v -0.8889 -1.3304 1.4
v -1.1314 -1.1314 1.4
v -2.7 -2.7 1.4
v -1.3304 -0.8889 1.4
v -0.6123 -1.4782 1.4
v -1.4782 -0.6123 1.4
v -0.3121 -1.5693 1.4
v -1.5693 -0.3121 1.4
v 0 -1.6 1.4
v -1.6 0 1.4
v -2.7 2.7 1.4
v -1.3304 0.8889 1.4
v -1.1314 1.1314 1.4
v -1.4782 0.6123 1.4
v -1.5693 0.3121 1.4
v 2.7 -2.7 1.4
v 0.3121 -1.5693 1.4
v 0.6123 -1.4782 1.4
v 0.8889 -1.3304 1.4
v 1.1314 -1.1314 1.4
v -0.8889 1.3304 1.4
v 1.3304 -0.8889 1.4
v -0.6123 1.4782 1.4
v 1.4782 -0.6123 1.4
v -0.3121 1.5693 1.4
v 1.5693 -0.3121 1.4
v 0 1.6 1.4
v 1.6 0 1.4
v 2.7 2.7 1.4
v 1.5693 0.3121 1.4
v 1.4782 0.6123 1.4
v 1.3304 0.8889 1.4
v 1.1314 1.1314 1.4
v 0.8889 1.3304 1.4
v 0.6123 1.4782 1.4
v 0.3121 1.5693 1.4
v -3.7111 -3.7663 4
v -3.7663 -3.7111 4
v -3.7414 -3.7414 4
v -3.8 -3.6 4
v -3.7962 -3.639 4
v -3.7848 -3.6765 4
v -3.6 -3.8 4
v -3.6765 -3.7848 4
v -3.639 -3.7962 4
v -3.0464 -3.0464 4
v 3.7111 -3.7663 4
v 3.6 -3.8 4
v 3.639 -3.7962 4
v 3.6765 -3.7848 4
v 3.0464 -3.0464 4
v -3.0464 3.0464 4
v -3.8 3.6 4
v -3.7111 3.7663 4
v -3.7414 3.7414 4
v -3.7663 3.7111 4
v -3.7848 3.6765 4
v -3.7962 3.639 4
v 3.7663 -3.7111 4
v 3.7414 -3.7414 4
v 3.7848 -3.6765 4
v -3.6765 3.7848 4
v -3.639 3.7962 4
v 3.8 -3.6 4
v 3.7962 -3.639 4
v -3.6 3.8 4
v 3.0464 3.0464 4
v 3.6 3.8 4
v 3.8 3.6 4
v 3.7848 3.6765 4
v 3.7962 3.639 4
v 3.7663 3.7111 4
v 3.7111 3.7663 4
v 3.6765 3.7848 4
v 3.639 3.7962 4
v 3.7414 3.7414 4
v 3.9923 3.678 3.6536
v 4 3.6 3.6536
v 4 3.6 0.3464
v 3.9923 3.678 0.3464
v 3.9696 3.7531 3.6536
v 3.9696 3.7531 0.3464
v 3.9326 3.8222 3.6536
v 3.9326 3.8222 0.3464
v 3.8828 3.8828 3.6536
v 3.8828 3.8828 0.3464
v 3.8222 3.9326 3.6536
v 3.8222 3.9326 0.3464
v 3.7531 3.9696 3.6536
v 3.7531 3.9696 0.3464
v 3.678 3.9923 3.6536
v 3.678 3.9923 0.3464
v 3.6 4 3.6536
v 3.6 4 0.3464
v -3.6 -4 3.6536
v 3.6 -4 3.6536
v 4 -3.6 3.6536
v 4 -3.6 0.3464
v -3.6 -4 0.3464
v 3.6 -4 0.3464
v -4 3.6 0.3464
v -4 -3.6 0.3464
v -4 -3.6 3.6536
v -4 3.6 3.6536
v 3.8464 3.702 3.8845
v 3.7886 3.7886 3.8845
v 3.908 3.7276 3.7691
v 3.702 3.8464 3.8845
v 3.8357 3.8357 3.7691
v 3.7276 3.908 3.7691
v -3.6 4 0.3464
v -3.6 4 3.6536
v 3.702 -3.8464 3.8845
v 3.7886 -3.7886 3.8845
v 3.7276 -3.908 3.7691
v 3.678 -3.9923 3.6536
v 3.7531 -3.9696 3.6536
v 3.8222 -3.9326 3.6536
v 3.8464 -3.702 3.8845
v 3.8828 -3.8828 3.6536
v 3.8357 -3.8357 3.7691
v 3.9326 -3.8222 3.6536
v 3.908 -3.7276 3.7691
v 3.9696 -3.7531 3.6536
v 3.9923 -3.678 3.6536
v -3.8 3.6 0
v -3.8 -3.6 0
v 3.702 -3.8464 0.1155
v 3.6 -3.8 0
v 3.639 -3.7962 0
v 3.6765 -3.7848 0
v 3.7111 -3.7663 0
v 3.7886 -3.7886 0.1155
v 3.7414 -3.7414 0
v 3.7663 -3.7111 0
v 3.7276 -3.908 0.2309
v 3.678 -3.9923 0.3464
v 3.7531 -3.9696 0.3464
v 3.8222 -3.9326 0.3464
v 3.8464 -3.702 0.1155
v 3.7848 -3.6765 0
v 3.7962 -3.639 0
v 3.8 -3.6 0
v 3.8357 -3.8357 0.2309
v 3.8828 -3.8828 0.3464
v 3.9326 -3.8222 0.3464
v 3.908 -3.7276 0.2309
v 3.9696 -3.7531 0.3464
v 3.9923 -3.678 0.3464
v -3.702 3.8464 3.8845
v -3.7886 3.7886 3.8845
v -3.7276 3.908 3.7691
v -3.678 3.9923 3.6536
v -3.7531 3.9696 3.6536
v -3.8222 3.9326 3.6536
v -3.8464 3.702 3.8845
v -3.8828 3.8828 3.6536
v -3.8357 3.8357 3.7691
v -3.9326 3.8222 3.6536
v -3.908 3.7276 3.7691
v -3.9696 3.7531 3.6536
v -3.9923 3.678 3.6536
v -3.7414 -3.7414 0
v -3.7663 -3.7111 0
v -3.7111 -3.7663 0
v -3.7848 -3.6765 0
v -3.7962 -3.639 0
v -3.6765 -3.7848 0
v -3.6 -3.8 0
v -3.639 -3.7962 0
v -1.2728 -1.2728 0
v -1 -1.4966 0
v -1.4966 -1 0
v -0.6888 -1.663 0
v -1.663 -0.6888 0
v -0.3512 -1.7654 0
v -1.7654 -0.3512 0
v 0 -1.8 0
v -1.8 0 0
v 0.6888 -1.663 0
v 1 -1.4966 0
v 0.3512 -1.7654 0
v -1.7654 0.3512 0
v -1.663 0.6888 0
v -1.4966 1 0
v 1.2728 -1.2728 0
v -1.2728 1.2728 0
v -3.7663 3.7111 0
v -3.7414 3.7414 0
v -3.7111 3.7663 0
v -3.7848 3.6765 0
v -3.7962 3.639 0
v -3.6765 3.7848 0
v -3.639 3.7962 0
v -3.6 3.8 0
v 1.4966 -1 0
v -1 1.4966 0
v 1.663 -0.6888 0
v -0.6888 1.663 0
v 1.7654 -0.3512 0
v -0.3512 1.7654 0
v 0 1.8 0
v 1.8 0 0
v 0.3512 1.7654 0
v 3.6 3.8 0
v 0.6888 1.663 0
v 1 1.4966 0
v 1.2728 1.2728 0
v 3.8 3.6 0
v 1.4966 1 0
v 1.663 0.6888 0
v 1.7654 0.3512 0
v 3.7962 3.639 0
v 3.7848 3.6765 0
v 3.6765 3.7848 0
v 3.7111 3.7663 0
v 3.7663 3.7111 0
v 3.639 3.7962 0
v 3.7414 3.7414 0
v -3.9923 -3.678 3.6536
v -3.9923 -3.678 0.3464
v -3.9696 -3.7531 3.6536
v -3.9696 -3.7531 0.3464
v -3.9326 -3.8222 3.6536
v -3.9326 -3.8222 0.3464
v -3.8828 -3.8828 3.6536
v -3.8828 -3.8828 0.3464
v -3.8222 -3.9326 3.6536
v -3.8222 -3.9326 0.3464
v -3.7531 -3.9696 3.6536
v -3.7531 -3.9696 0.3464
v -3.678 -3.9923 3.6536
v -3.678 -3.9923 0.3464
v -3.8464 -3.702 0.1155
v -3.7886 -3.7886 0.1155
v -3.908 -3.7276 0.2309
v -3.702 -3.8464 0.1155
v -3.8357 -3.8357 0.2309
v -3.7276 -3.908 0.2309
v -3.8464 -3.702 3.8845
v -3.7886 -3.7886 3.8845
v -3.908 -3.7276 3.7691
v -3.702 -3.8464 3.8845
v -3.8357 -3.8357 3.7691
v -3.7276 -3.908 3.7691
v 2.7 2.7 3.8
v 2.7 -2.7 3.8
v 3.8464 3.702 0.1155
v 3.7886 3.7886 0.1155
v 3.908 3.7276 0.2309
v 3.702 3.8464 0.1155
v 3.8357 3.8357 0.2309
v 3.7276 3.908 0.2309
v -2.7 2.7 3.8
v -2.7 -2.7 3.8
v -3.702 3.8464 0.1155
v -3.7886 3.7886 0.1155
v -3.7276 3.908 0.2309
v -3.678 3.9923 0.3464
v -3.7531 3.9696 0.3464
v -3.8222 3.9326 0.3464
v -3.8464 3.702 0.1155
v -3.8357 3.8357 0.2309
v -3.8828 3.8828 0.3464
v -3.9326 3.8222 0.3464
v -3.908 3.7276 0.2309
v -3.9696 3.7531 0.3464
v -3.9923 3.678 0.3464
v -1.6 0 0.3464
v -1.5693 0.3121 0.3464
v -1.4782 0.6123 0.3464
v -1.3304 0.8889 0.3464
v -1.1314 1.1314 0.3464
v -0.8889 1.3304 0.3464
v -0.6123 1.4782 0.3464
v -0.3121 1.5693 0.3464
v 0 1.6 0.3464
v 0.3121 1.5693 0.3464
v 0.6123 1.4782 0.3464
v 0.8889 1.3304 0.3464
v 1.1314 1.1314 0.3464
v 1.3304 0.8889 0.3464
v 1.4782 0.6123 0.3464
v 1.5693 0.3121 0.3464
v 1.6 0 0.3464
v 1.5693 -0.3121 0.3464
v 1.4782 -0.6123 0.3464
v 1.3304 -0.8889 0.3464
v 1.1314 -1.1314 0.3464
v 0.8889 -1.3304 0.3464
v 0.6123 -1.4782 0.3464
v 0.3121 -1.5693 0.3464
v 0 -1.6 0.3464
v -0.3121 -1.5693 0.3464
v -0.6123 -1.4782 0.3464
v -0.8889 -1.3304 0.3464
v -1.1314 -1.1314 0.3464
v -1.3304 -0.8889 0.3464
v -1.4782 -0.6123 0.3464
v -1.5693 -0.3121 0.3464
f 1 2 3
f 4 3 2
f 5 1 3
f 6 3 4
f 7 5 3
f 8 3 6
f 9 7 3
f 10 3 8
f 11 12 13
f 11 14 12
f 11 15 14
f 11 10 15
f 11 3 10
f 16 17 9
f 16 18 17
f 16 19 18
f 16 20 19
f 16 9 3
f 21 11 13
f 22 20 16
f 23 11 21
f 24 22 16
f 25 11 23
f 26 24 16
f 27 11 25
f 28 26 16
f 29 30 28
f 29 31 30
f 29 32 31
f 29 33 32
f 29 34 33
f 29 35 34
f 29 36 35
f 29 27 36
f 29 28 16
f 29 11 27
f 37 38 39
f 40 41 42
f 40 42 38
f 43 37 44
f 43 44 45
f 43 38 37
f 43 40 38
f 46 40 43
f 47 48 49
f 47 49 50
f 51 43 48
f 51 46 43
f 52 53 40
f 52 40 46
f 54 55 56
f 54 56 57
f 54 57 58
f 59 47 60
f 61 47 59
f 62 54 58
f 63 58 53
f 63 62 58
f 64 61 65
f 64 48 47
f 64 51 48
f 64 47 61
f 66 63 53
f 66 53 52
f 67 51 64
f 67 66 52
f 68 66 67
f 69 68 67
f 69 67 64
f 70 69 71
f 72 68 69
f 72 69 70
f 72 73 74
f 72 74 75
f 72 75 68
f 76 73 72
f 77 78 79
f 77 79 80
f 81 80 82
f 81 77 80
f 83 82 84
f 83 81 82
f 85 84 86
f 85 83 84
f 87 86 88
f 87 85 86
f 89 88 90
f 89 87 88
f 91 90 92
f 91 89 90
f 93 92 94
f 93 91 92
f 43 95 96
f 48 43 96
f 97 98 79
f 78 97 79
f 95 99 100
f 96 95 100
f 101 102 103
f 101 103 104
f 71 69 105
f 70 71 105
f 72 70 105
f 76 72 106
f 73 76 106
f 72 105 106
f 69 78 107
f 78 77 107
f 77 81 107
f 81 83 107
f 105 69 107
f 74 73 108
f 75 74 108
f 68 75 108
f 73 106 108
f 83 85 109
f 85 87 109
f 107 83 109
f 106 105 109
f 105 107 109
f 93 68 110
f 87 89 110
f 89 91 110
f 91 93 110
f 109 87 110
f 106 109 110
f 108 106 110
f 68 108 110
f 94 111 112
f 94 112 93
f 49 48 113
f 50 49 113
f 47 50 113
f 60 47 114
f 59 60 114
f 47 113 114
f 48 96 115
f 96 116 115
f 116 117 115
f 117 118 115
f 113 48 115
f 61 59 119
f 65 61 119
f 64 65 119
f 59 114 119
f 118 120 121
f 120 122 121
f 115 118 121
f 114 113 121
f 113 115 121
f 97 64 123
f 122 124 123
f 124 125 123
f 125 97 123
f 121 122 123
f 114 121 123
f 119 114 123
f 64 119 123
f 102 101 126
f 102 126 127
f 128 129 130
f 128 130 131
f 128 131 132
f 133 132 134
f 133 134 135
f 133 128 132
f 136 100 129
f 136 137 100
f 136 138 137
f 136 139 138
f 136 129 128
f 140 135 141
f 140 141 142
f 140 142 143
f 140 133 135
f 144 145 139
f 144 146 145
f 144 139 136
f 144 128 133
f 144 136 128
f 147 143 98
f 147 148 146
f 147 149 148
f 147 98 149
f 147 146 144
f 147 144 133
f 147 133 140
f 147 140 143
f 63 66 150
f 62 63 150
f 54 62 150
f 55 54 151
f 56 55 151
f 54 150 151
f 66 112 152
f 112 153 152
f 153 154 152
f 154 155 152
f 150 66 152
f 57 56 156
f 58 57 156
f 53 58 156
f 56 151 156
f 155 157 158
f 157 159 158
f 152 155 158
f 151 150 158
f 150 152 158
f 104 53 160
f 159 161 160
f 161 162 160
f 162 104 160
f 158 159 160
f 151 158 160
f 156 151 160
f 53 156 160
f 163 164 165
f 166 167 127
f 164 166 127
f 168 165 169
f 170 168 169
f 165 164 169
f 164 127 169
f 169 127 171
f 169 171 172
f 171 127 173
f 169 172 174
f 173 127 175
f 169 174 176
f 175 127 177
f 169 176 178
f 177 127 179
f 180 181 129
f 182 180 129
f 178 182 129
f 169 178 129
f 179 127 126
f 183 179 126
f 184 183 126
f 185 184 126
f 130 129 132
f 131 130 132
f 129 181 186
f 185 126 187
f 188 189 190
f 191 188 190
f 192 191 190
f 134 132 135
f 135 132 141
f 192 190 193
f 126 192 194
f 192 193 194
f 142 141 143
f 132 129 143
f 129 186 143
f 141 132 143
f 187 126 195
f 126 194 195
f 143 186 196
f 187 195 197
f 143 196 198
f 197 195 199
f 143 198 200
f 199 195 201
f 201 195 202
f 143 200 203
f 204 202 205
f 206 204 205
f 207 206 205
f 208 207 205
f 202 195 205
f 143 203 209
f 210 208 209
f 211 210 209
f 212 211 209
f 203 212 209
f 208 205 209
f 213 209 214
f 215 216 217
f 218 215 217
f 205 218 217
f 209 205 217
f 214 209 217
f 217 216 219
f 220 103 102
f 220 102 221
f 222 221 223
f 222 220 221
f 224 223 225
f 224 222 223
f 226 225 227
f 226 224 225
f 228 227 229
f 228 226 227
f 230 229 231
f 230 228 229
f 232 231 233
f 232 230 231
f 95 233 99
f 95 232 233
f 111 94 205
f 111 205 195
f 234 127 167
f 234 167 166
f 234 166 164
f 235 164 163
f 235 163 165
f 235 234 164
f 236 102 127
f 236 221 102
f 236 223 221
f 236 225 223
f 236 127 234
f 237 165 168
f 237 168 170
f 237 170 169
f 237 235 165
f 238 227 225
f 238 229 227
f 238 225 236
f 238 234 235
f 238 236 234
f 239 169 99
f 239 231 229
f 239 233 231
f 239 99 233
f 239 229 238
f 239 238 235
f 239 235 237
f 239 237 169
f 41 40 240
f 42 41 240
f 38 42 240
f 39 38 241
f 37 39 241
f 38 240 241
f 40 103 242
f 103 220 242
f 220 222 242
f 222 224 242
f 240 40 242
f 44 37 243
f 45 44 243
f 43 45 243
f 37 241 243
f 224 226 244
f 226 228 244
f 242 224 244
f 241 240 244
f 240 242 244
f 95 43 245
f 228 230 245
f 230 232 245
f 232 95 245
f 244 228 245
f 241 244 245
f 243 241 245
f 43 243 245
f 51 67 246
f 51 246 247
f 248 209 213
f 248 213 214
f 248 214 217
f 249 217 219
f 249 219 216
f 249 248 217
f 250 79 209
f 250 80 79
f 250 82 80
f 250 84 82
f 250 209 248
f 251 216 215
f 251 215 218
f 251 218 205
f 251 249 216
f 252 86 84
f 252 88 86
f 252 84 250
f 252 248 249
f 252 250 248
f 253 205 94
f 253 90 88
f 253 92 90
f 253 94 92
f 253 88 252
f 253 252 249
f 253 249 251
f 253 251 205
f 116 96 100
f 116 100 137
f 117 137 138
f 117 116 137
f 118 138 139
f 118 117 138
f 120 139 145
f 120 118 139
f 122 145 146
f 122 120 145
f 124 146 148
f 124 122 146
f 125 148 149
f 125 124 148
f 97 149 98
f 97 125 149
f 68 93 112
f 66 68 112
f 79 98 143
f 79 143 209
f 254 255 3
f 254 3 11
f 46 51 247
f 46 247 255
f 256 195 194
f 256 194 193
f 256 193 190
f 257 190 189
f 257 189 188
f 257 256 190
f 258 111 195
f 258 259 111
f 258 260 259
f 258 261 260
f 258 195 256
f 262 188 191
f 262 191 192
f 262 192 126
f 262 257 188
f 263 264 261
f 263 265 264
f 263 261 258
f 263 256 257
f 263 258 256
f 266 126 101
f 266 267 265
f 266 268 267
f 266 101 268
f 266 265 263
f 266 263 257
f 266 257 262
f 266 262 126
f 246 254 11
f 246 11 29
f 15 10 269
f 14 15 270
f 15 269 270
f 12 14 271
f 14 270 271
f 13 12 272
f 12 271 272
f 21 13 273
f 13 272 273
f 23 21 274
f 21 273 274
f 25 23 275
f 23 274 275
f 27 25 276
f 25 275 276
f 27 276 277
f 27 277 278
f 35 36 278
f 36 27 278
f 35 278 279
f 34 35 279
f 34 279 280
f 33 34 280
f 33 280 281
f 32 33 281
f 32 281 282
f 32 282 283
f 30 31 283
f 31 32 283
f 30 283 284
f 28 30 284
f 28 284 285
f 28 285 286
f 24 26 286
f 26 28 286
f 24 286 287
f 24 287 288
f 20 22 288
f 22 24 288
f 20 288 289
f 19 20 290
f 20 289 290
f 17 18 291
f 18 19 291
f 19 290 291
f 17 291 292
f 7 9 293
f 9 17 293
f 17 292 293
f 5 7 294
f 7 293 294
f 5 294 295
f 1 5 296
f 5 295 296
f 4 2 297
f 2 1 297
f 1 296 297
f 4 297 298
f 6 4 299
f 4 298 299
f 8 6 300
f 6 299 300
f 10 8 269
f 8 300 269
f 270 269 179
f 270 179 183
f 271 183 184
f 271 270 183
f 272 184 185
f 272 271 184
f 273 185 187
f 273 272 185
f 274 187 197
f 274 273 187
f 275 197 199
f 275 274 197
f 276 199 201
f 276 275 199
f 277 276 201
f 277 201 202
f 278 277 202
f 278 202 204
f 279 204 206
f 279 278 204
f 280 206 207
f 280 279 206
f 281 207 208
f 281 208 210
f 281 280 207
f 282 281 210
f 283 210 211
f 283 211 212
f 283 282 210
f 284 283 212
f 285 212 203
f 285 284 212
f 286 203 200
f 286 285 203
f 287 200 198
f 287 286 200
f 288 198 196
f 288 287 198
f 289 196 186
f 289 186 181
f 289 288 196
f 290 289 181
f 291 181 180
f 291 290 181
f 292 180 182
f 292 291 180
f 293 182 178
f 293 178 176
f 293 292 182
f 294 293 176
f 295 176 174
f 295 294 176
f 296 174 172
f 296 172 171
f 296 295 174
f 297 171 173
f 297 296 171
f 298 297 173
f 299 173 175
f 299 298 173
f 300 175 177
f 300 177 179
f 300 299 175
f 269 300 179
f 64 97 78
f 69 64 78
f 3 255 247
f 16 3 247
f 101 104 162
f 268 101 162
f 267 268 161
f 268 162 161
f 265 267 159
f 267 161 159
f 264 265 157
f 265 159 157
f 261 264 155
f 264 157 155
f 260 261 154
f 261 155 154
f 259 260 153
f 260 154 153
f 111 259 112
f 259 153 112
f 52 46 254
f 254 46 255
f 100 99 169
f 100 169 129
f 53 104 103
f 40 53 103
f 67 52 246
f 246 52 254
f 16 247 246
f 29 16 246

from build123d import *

# Parameters (mm, degrees)
SKETCH1_W             = 8
SKETCH1_H             = 8
BOSS_EXTRUDE1_DEPTH   = 4
FILLET1_R             = 0.4
SKETCH3_R             = 1.6
CUT_EXTRUDE1_DEPTH    = 5
SKETCH4_W             = 5.4
SKETCH4_H             = 5.4
SKETCH4_R             = 1.6
CUT_EXTRUDE2_DEPTH    = 2.6
CHAMFER1_SIZE         = 0.2
CHAMFER1_SIZE2        = 0.346410162
CHAMFER1_PART_2_SIZE  = 0.2
CHAMFER1_PART_2_SIZE2 = 0.346410162
CHAMFER1_PART_3_SIZE  = 0.2
CHAMFER1_PART_3_SIZE2 = 0.346410162
CHAMFER1_PART_4_SIZE  = 0.2
CHAMFER1_PART_4_SIZE2 = 0.346410162
CHAMFER1_PART_5_SIZE  = 0.2
CHAMFER1_PART_5_SIZE2 = 0.346410162
CHAMFER1_PART_6_SIZE  = 0.2
CHAMFER1_PART_6_SIZE2 = 0.346410162


with BuildPart() as part:
    # Sketch1 → Boss-Extrude1 (new body)
    with BuildSketch(Plane.XY):
        Rectangle(SKETCH1_W, SKETCH1_H)
    extrude(amount=BOSS_EXTRUDE1_DEPTH)

    # Fillet1
    fillet1_edges = [part.edges().sort_by_distance(p)[0] for p in [
        (-4, 4, 2),
        (4, 4, 2),
        (4, -4, 2),
        (-4, -4, 2),
    ]]
    fillet(fillet1_edges, radius=FILLET1_R)

    # Sketch3 → Cut-Extrude1 (cut, through all)
    with BuildSketch(Plane(origin=(0, 0, 0), x_dir=(-1, 0, 0), z_dir=(0, 0, -1))):
        Circle(SKETCH3_R)
    extrude(amount=-CUT_EXTRUDE1_DEPTH, mode=Mode.SUBTRACT)

    # Sketch4 → Cut-Extrude2 (cut)
    with BuildSketch(Plane.XY.offset(4)):
        Rectangle(SKETCH4_W, SKETCH4_H)
        with Locations(Location((0, 0, 0), (0, 0, 180))):  # turned: the seam where the file's is
            Circle(SKETCH4_R, mode=Mode.SUBTRACT)
    extrude(amount=-CUT_EXTRUDE2_DEPTH, mode=Mode.SUBTRACT)

    # Chamfer1
    chamfer1_edges = [part.edges().sort_by_distance(p)[0] for p in [
        (0, -4, 0),
        (-4, 0, 0),
        (0, 4, 0),
        (4, 0, 0),
        (-3.882842712, 3.882842712, 0),
        (3.882842712, 3.882842712, 0),
        (3.882842712, -3.882842712, 0),
        (-3.882842712, -3.882842712, 0),
        (1.6, 0, 0),
    ]]
    chamfer1_side = [part.faces().sort_by_distance(p)[0] for p in [
        (0, 3.886862915, 0),
    ]]
    chamfer(chamfer1_edges, length=CHAMFER1_SIZE, length2=CHAMFER1_SIZE2, reference=chamfer1_side[0])

    # Chamfer1 part 2
    chamfer1_part_2_edges = [part.edges().sort_by_distance(p)[0] for p in [
        (0, -4, 4),
        (-4, 0, 4),
        (4, 0, 4),
        (0, 4, 4),
        (-3.882842712, 3.882842712, 4),
        (3.882842712, 3.882842712, 4),
        (3.882842712, -3.882842712, 4),
        (-3.882842712, -3.882842712, 4),
    ]]
    chamfer1_part_2_side = [part.faces().sort_by_distance(p)[0] for p in [
        (0, 3.886862915, 4),
    ]]
    chamfer(chamfer1_part_2_edges, length=CHAMFER1_PART_2_SIZE, length2=CHAMFER1_PART_2_SIZE2, reference=chamfer1_part_2_side[0])

    # Chamfer1 part 3
    chamfer1_part_3_edges = [part.edges().sort_by_distance(p)[0] for p in [
        (-2.7, 0, 4),
    ]]
    chamfer1_part_3_side = [part.faces().sort_by_distance(p)[0] for p in [
        (-2.7, 0, 2.7),
    ]]
    chamfer(chamfer1_part_3_edges, length=CHAMFER1_PART_3_SIZE, length2=CHAMFER1_PART_3_SIZE2, reference=chamfer1_part_3_side[0])

    # Chamfer1 part 4
    chamfer1_part_4_edges = [part.edges().sort_by_distance(p)[0] for p in [
        (0, -2.7, 4),
    ]]
    chamfer1_part_4_side = [part.faces().sort_by_distance(p)[0] for p in [
        (0, -2.7, 2.7),
    ]]
    chamfer(chamfer1_part_4_edges, length=CHAMFER1_PART_4_SIZE, length2=CHAMFER1_PART_4_SIZE2, reference=chamfer1_part_4_side[0])

    # Chamfer1 part 5
    chamfer1_part_5_edges = [part.edges().sort_by_distance(p)[0] for p in [
        (2.7, 0, 4),
    ]]
    chamfer1_part_5_side = [part.faces().sort_by_distance(p)[0] for p in [
        (2.7, 0, 2.7),
    ]]
    chamfer(chamfer1_part_5_edges, length=CHAMFER1_PART_5_SIZE, length2=CHAMFER1_PART_5_SIZE2, reference=chamfer1_part_5_side[0])

    # Chamfer1 part 6
    chamfer1_part_6_edges = [part.edges().sort_by_distance(p)[0] for p in [
        (0, 2.7, 4),
    ]]
    chamfer1_part_6_side = [part.faces().sort_by_distance(p)[0] for p in [
        (0, 2.7, 2.7),
    ]]
    chamfer(chamfer1_part_6_edges, length=CHAMFER1_PART_6_SIZE, length2=CHAMFER1_PART_6_SIZE2, reference=chamfer1_part_6_side[0])


solid = part.part
